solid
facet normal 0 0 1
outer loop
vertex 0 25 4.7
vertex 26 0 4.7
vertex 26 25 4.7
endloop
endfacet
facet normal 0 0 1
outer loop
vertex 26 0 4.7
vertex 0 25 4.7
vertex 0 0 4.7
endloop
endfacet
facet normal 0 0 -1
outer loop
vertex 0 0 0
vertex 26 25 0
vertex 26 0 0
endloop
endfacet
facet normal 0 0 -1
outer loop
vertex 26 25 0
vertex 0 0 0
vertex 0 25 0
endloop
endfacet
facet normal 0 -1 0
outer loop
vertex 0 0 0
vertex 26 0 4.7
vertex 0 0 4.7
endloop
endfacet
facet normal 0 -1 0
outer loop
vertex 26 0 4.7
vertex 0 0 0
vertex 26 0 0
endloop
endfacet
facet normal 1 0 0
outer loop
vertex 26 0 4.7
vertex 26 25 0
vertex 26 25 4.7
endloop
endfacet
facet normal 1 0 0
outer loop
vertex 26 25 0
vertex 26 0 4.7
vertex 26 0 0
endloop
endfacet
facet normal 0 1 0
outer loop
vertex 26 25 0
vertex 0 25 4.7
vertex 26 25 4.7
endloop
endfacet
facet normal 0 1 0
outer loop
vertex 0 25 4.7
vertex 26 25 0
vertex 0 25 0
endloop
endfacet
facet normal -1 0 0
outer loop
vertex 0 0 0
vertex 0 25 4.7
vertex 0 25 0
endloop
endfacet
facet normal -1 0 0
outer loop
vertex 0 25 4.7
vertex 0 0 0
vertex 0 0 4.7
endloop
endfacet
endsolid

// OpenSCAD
$fn = 64;

size = [26, 25, 4.7];

cube(size, center = false);
